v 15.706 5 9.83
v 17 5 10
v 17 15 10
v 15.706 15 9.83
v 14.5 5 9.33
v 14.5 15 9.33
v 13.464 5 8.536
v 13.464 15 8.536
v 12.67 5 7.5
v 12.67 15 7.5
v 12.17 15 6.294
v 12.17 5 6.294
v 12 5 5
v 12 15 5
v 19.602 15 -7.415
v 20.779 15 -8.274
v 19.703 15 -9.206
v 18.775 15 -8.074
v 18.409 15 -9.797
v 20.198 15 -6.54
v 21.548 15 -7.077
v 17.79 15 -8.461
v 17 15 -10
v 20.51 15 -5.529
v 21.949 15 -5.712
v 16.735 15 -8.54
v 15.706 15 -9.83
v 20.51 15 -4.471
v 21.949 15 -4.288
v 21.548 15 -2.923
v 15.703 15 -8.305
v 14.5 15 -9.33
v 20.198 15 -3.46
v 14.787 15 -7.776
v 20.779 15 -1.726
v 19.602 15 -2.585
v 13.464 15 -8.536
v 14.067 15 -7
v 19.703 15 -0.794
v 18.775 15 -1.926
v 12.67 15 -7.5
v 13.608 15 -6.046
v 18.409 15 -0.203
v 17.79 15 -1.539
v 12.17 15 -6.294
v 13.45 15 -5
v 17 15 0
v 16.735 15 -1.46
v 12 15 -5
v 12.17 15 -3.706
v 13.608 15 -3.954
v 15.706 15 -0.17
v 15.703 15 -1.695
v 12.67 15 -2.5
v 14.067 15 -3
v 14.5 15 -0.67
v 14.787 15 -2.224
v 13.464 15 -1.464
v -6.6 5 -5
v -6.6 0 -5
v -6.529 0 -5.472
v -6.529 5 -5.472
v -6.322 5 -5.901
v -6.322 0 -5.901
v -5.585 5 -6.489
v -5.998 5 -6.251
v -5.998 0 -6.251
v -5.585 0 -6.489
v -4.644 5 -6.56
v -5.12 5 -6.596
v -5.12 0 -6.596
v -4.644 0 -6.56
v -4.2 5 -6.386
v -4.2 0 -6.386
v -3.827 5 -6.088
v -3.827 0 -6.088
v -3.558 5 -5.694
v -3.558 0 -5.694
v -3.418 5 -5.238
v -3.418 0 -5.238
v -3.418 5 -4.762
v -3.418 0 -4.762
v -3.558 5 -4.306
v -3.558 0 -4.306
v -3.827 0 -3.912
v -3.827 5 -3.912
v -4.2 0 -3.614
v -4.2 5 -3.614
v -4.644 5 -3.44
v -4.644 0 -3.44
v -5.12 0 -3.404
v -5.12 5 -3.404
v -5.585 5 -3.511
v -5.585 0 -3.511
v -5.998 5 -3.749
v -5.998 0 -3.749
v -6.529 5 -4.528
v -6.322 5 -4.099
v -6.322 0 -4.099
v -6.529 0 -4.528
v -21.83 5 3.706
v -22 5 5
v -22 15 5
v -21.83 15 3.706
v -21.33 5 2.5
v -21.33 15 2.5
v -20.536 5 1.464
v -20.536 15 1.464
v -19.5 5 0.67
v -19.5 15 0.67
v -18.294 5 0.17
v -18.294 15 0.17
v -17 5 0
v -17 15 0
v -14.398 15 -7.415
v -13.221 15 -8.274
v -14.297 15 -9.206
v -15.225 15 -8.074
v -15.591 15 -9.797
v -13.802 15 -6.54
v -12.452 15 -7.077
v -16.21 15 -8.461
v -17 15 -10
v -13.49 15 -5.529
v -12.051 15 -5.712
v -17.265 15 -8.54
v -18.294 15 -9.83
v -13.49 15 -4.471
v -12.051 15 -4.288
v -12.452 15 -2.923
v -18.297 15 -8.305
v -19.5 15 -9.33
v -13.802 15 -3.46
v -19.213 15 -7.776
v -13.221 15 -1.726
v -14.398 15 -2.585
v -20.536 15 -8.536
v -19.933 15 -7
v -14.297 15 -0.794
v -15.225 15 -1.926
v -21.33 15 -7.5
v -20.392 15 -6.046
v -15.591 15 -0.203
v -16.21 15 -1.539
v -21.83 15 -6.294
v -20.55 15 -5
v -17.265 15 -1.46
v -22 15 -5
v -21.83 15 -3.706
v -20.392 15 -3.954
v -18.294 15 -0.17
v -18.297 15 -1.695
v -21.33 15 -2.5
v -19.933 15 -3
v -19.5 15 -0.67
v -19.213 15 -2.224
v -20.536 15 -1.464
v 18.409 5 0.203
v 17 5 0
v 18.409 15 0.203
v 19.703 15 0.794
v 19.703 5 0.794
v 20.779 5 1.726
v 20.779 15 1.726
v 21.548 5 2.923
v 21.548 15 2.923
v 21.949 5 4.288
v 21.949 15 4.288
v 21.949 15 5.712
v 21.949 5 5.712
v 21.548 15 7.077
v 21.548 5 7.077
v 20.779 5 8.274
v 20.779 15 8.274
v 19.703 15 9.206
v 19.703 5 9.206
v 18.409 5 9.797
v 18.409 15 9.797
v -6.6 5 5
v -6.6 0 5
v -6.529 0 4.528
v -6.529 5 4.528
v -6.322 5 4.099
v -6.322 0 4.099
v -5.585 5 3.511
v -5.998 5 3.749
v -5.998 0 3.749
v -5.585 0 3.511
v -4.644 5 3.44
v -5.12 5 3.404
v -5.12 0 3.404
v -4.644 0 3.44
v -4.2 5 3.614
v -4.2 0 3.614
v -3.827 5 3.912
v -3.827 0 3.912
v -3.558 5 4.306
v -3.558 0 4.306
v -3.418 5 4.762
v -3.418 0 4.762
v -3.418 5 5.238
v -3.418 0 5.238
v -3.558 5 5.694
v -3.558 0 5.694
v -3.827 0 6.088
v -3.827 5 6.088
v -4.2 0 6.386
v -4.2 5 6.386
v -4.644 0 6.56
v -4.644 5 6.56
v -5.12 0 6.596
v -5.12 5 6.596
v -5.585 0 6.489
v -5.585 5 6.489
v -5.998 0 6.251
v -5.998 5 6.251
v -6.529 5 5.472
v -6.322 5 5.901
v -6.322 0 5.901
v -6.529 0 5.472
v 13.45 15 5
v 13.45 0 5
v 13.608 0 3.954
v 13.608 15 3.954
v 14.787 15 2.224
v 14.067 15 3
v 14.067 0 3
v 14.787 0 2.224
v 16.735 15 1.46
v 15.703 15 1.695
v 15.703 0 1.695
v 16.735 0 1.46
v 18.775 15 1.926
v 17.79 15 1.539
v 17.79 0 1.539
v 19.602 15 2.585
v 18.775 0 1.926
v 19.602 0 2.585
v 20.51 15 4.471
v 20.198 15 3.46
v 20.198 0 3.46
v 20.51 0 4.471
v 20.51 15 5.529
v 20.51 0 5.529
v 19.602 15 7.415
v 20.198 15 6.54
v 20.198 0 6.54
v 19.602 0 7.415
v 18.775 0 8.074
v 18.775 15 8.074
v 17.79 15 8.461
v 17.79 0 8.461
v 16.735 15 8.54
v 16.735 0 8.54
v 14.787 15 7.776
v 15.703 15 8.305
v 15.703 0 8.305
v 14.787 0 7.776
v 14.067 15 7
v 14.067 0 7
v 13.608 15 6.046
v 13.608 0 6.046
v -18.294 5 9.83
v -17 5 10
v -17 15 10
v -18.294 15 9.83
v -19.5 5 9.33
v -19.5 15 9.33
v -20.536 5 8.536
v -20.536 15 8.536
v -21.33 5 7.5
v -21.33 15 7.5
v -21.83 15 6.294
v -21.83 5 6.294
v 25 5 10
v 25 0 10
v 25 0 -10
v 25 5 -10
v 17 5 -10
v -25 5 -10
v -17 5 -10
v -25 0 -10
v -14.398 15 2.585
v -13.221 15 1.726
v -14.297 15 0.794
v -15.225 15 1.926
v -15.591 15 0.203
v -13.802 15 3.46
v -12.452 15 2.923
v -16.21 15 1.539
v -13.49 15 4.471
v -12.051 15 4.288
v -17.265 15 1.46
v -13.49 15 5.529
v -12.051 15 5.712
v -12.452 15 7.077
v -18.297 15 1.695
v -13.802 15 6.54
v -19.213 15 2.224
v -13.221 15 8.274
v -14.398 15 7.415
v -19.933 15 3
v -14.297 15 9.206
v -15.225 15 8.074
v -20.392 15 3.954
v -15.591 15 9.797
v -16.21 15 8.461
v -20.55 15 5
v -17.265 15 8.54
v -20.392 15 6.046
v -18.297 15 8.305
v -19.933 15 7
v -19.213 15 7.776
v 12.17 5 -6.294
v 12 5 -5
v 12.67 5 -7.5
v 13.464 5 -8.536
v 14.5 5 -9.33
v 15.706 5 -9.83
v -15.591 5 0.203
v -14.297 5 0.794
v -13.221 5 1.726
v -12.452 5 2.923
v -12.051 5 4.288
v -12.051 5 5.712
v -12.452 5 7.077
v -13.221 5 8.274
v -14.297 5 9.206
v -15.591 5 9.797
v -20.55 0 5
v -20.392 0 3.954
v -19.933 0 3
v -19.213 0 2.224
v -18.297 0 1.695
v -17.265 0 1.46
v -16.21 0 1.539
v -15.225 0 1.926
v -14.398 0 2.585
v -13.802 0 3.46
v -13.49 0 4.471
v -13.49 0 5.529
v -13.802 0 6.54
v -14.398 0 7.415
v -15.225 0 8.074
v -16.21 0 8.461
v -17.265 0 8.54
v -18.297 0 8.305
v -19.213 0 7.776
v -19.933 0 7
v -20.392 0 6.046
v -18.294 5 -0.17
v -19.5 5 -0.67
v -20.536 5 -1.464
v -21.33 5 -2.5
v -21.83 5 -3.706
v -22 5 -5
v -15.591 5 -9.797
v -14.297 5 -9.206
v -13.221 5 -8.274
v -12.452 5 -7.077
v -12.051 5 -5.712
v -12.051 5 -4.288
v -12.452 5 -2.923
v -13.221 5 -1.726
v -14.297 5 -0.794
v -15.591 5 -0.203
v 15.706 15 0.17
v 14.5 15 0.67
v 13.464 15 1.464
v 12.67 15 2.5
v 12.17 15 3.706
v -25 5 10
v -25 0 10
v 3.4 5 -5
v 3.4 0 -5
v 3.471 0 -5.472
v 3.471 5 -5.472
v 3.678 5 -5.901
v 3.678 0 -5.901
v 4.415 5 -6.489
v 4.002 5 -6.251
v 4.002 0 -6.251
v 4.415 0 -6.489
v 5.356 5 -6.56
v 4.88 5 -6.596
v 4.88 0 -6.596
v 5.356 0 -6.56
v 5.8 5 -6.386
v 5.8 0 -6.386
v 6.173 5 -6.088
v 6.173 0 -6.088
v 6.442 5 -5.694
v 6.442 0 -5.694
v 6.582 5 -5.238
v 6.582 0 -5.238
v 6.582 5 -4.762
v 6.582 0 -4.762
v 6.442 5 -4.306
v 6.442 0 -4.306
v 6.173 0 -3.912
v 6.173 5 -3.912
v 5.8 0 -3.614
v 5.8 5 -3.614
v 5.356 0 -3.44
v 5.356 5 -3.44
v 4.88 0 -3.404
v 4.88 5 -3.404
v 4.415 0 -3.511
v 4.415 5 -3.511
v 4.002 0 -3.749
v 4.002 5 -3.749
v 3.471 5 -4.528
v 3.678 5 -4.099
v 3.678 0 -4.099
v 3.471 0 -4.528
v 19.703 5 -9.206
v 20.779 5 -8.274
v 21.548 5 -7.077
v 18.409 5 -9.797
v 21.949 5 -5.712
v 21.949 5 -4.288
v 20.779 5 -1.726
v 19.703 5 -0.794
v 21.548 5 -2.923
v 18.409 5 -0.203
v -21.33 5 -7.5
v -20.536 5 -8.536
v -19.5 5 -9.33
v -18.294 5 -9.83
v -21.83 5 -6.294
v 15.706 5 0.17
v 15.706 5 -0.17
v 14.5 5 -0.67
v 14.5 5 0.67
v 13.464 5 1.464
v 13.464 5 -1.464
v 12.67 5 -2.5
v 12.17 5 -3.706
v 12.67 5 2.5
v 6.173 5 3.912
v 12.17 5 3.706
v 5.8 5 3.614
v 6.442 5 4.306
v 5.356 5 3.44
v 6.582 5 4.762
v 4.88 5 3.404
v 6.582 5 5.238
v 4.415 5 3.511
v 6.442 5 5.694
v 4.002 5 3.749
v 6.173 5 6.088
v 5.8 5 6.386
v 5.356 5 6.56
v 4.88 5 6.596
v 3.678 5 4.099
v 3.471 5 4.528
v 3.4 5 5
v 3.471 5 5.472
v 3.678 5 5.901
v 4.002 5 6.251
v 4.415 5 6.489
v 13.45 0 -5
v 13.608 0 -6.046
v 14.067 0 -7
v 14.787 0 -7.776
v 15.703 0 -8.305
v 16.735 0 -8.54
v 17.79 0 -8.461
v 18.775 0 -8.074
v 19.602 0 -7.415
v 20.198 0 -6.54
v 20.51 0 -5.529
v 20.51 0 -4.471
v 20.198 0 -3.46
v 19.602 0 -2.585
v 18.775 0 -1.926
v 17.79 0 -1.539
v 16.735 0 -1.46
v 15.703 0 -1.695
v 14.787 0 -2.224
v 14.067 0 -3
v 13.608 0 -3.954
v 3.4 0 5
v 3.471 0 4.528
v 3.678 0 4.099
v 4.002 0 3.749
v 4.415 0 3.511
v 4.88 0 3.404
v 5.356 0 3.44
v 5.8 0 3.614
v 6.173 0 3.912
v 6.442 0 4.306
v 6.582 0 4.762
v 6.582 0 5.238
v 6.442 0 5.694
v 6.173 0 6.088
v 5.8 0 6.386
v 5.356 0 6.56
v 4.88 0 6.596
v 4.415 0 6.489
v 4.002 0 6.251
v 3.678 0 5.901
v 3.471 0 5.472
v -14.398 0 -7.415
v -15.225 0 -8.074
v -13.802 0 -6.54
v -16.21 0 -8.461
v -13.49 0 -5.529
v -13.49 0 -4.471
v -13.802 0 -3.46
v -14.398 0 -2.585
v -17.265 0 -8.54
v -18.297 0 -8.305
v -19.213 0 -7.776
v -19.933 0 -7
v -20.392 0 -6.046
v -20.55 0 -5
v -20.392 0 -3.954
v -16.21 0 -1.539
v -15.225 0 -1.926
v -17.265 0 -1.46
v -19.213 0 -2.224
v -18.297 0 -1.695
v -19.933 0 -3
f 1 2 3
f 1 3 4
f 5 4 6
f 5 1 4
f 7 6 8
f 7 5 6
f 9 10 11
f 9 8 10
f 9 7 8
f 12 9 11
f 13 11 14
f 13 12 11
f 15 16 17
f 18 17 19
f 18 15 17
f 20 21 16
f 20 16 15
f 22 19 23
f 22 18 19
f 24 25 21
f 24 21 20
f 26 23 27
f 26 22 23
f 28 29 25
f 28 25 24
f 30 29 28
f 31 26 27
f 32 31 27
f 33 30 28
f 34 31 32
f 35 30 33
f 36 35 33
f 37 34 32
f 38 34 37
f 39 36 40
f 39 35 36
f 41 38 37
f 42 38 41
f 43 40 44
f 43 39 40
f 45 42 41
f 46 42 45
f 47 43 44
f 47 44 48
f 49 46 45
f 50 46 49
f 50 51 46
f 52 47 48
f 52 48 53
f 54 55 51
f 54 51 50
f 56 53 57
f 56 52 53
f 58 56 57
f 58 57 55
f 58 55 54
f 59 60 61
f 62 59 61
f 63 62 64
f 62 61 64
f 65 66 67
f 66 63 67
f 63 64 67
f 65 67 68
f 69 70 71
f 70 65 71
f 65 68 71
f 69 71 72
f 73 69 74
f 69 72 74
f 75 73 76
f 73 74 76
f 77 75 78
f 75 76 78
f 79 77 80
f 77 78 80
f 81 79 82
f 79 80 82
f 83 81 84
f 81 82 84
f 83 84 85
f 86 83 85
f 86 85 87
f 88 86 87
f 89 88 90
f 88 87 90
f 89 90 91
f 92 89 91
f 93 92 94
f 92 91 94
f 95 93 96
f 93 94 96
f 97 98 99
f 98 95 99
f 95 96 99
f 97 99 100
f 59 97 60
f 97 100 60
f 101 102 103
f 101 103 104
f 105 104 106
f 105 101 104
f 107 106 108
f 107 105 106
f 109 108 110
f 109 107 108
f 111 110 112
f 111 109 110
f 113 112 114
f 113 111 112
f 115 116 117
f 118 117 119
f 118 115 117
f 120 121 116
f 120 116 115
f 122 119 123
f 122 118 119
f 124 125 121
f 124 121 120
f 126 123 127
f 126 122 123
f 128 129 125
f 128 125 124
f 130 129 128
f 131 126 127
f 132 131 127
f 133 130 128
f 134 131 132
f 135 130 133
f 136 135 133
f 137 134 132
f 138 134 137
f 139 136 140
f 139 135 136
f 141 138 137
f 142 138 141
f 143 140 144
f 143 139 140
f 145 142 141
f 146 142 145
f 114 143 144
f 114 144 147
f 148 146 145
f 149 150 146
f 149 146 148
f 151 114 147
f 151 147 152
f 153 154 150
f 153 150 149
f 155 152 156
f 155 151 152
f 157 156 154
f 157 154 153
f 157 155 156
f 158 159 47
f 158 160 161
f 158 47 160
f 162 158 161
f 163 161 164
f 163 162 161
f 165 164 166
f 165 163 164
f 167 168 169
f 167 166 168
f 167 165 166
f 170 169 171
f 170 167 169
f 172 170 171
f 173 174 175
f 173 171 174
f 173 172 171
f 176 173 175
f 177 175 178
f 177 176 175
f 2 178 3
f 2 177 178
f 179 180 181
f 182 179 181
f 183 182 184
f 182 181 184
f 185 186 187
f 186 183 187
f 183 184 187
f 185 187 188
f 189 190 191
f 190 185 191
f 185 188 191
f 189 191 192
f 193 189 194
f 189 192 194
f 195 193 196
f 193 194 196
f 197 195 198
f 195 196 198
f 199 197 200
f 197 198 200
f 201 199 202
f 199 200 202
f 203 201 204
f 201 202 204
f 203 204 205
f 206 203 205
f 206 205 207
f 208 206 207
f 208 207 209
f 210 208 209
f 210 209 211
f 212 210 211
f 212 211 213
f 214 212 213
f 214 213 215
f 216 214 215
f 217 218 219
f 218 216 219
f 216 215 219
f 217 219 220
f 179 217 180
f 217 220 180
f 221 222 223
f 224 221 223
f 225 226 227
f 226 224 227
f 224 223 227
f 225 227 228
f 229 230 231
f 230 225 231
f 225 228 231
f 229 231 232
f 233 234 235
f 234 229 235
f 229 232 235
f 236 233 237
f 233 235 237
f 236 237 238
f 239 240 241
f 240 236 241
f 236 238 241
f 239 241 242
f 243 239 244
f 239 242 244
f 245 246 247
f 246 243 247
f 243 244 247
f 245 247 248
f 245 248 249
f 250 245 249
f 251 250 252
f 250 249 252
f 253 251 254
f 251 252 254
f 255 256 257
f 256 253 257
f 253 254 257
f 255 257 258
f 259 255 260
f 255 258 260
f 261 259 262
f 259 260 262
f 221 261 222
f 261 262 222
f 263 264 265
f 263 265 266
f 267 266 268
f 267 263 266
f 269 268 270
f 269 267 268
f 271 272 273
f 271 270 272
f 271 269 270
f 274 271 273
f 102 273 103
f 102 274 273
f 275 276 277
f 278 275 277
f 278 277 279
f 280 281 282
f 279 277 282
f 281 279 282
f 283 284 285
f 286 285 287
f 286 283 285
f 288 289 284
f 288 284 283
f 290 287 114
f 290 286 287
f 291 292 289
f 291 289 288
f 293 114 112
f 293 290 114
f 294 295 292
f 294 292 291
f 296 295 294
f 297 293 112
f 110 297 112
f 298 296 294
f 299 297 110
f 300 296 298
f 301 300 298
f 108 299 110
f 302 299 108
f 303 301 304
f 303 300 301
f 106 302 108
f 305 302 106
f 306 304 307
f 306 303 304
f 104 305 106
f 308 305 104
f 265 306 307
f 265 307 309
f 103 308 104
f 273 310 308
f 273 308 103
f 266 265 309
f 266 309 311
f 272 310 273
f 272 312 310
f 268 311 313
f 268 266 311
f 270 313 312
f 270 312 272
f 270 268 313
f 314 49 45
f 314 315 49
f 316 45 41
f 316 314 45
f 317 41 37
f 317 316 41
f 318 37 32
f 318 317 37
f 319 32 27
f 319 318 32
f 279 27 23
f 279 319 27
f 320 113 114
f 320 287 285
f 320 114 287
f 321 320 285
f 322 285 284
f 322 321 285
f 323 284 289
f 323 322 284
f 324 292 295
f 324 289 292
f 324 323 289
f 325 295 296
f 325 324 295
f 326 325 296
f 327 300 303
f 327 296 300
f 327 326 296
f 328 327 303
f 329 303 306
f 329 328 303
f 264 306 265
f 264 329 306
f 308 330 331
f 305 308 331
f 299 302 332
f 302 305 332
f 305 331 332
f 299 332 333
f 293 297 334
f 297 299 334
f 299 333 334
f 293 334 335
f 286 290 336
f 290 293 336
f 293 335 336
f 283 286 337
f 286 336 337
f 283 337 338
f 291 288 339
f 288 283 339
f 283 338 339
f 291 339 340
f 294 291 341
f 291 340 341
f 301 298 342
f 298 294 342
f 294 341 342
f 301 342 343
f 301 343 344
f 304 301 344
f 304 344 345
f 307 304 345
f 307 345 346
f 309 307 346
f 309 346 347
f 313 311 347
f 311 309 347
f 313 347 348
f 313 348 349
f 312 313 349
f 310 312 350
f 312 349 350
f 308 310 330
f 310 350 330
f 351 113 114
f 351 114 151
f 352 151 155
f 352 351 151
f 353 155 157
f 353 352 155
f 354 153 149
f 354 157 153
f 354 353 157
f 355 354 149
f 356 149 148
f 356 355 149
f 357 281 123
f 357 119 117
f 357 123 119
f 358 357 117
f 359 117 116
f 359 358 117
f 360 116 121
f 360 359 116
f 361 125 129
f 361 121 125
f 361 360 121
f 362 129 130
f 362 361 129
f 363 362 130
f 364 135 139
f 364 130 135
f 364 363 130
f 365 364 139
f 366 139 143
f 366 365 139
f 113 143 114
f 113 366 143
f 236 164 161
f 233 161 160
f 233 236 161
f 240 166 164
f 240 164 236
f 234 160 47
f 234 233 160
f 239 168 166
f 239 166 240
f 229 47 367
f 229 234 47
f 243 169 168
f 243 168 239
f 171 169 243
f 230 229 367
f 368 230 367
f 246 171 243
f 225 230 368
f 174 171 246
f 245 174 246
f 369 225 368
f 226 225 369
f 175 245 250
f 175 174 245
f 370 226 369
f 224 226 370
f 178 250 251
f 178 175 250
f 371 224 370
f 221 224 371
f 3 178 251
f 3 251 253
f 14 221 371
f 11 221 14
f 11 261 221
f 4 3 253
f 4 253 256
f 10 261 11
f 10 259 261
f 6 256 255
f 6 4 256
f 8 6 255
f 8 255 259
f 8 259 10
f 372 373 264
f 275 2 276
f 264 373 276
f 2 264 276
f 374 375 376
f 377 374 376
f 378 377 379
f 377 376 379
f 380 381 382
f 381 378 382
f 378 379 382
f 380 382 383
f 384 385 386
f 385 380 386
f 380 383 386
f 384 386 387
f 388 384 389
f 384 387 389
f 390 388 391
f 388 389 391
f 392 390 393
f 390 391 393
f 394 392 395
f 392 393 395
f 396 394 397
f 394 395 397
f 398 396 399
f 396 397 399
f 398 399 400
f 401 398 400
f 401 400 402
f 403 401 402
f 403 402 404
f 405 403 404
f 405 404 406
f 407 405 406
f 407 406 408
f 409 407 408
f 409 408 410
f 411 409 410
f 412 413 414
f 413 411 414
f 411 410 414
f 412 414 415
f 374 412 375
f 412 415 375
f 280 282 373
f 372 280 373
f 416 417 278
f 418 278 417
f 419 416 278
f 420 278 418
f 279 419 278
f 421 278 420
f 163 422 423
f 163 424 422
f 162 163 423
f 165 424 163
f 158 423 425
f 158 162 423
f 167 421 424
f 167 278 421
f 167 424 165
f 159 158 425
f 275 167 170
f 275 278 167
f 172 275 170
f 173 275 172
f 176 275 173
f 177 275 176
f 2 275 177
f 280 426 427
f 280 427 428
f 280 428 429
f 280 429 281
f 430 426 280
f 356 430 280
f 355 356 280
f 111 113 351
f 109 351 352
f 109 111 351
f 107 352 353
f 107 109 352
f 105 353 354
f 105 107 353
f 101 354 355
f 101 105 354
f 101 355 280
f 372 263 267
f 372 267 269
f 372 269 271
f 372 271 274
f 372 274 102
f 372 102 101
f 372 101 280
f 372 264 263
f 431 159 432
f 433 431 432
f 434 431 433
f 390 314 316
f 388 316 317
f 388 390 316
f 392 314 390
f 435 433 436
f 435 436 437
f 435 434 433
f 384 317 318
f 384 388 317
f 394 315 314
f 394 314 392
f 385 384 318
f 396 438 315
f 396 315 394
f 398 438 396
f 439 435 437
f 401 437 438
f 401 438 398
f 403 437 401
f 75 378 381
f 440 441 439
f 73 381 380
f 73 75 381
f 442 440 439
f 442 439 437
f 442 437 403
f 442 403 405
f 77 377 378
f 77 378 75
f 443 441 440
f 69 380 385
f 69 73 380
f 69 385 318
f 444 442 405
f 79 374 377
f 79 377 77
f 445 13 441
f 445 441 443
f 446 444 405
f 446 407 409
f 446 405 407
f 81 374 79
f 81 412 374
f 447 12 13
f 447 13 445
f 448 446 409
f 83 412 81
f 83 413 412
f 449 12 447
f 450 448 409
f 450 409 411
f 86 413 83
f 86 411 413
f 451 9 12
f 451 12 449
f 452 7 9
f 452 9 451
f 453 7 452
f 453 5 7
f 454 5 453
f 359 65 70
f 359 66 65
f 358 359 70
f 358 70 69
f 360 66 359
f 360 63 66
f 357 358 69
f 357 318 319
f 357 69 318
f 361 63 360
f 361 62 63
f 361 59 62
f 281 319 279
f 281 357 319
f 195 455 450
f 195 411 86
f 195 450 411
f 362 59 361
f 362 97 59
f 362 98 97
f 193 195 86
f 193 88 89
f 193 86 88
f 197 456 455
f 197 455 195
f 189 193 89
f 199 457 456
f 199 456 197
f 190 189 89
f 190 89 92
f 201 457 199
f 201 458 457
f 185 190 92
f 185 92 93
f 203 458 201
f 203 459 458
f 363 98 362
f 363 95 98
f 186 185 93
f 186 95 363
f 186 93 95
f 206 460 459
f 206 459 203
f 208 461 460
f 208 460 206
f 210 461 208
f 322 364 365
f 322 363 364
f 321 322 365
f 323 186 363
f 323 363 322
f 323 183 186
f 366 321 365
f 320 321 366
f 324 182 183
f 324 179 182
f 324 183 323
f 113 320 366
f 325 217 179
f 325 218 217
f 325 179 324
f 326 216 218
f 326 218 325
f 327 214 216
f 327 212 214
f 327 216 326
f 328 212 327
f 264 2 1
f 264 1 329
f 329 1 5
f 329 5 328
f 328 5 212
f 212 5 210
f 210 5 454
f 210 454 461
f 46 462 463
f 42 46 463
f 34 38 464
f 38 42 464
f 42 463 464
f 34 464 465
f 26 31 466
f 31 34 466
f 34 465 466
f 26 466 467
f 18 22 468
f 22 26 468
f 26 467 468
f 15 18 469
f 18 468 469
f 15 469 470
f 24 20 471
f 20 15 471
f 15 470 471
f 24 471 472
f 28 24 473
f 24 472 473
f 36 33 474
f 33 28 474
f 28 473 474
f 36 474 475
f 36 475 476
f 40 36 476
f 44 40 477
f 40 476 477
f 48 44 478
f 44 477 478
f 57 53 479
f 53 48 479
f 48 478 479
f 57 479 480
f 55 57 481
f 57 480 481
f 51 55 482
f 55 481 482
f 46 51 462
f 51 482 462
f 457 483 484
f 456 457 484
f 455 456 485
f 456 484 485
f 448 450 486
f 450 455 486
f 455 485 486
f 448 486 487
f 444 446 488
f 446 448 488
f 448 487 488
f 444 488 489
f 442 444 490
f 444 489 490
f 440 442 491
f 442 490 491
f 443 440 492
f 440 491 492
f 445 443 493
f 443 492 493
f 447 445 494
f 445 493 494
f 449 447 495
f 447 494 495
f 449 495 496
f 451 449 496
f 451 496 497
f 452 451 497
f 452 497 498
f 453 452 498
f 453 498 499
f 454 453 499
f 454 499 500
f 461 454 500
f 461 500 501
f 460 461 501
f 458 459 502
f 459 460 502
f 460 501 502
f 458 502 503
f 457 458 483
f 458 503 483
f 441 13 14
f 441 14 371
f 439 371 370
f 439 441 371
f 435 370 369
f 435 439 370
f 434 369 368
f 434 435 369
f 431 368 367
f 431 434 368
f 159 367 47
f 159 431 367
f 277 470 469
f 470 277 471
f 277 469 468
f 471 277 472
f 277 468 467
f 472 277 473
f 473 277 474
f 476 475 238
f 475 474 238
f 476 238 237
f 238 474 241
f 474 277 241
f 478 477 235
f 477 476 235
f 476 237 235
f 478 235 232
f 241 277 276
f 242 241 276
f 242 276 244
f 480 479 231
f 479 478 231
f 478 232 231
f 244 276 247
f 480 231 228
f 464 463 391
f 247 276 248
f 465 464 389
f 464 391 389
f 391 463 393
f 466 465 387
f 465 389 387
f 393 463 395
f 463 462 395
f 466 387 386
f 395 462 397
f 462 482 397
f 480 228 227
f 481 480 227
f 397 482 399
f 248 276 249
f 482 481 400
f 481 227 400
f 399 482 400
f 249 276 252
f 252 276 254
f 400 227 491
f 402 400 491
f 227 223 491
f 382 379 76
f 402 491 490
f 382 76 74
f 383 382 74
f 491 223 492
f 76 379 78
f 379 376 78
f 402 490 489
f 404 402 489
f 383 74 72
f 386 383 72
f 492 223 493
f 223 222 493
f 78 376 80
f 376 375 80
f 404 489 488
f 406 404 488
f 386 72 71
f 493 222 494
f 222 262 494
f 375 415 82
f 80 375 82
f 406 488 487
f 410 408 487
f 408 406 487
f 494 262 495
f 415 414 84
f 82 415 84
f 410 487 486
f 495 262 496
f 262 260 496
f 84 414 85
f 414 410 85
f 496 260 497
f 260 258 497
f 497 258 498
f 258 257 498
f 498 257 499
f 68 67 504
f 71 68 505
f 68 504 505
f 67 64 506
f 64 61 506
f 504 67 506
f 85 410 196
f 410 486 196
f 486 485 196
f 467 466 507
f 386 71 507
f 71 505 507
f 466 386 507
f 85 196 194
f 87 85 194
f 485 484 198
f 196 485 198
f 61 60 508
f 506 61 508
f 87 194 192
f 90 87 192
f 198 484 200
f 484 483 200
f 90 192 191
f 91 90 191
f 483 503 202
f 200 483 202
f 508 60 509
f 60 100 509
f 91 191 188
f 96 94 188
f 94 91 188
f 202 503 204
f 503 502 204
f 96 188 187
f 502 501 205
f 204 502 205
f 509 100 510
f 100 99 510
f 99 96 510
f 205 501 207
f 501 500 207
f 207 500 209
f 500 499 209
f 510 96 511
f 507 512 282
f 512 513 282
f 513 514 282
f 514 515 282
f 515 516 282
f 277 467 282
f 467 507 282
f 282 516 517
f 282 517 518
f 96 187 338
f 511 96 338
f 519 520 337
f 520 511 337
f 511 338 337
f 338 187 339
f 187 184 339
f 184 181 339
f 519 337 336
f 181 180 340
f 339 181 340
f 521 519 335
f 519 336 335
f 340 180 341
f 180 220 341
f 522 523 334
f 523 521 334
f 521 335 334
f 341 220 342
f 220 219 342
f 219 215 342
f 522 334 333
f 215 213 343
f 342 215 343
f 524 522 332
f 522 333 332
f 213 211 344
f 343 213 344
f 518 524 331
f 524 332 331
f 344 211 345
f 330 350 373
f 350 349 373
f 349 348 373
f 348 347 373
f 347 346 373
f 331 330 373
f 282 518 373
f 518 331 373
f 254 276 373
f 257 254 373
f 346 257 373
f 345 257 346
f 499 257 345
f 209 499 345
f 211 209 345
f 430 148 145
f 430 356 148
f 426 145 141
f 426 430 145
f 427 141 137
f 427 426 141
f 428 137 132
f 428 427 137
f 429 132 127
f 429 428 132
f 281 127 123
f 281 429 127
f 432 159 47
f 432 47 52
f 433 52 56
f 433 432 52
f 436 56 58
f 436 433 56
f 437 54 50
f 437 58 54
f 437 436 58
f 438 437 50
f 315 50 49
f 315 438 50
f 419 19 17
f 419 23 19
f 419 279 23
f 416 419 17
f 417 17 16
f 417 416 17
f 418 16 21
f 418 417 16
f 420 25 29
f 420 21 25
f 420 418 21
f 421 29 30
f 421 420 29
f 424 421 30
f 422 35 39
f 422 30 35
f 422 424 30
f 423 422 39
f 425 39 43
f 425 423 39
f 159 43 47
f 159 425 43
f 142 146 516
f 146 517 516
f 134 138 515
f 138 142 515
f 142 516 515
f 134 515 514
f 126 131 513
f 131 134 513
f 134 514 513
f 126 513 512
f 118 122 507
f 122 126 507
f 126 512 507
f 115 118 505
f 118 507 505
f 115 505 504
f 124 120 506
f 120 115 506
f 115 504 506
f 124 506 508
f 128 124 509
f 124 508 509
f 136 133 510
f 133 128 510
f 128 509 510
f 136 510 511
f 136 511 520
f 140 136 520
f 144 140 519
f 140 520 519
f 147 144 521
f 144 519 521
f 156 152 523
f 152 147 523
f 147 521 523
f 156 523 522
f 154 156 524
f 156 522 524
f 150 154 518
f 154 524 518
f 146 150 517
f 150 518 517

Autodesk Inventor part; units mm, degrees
ref_plane "YZ Plane" through (0, 0, 0) normal (1, 0, 0) x (0, 1, 0)
ref_plane "XZ Plane" through (0, 0, 0) normal (0, 1, 0) x (-1, 0, 0)
ref_plane "XY Plane" through (0, 0, 0) normal (0, 0, 1) x (1, 0, 0)
sketch "Sketch1" plane through (0, 0, 0) normal (0, 1, 0) x (-1, 0, 0)
  line L0 (25, 10) -> (-25, 10)
  line L1 (-25, 10) -> (-25, -10)
  line L2 (-25, -10) -> (25, -10)
  line L3 (25, -10) -> (25, 10)
  line L4 (25, 10) -> (-25, -10) construction
  line L5 (-25, 10) -> (25, -10) construction
  circle A0 centre (-17, 5) radius 3.55
  line L6 (32, 0) -> (-42, 0) construction
  line L7 (0, 26) -> (0, -35) construction
  circle A1 centre (-5, 5) radius 1.6
  circle A2 centre (-17, -5) radius 3.55
  circle A3 centre (-5, -5) radius 1.6
  circle A4 centre (17, 5) radius 3.55
  circle A5 centre (5, 5) radius 1.6
  circle A6 centre (5, -5) radius 1.6
  circle A7 centre (17, -5) radius 3.55
  circle A8 centre (-17, -5) radius 5
  circle A9 centre (-17, 5) radius 5
  circle A10 centre (17, 5) radius 5
  circle A11 centre (17, -5) radius 5
  point P0 (0, 0)
  point P1 (17, 10)
  point P2 (17, 0)
  point P3 (17, -10)
  point P4 (-17, 10)
  point P5 (-17, 0)
  point P6 (-17, -10)
  dimension "d0" = 50
  dimension "d1" = 20
  dimension "d2" = 7.1
  dimension "d3" = 5
  dimension "d4" = 3.2
  dimension "d5" = 12
  dimension "d6" = 10
  dimension "d7" = 10
  dimension "d8" = 10
  dimension "d9" = 10
extrude "Extrusion1" add sketch "Sketch1" along normal blind 5 contours L3 L2 A11 A10 L0 | A10 A11 L2 A8 A9 L0 | A9 A8 L2 L1 L0
extrude "Extrusion2" add sketch "Sketch1" along normal blind 15 contours A10 | A9 | A11 | A8
properties part number "Fix Double Bracket Lifter_3DPrint"
